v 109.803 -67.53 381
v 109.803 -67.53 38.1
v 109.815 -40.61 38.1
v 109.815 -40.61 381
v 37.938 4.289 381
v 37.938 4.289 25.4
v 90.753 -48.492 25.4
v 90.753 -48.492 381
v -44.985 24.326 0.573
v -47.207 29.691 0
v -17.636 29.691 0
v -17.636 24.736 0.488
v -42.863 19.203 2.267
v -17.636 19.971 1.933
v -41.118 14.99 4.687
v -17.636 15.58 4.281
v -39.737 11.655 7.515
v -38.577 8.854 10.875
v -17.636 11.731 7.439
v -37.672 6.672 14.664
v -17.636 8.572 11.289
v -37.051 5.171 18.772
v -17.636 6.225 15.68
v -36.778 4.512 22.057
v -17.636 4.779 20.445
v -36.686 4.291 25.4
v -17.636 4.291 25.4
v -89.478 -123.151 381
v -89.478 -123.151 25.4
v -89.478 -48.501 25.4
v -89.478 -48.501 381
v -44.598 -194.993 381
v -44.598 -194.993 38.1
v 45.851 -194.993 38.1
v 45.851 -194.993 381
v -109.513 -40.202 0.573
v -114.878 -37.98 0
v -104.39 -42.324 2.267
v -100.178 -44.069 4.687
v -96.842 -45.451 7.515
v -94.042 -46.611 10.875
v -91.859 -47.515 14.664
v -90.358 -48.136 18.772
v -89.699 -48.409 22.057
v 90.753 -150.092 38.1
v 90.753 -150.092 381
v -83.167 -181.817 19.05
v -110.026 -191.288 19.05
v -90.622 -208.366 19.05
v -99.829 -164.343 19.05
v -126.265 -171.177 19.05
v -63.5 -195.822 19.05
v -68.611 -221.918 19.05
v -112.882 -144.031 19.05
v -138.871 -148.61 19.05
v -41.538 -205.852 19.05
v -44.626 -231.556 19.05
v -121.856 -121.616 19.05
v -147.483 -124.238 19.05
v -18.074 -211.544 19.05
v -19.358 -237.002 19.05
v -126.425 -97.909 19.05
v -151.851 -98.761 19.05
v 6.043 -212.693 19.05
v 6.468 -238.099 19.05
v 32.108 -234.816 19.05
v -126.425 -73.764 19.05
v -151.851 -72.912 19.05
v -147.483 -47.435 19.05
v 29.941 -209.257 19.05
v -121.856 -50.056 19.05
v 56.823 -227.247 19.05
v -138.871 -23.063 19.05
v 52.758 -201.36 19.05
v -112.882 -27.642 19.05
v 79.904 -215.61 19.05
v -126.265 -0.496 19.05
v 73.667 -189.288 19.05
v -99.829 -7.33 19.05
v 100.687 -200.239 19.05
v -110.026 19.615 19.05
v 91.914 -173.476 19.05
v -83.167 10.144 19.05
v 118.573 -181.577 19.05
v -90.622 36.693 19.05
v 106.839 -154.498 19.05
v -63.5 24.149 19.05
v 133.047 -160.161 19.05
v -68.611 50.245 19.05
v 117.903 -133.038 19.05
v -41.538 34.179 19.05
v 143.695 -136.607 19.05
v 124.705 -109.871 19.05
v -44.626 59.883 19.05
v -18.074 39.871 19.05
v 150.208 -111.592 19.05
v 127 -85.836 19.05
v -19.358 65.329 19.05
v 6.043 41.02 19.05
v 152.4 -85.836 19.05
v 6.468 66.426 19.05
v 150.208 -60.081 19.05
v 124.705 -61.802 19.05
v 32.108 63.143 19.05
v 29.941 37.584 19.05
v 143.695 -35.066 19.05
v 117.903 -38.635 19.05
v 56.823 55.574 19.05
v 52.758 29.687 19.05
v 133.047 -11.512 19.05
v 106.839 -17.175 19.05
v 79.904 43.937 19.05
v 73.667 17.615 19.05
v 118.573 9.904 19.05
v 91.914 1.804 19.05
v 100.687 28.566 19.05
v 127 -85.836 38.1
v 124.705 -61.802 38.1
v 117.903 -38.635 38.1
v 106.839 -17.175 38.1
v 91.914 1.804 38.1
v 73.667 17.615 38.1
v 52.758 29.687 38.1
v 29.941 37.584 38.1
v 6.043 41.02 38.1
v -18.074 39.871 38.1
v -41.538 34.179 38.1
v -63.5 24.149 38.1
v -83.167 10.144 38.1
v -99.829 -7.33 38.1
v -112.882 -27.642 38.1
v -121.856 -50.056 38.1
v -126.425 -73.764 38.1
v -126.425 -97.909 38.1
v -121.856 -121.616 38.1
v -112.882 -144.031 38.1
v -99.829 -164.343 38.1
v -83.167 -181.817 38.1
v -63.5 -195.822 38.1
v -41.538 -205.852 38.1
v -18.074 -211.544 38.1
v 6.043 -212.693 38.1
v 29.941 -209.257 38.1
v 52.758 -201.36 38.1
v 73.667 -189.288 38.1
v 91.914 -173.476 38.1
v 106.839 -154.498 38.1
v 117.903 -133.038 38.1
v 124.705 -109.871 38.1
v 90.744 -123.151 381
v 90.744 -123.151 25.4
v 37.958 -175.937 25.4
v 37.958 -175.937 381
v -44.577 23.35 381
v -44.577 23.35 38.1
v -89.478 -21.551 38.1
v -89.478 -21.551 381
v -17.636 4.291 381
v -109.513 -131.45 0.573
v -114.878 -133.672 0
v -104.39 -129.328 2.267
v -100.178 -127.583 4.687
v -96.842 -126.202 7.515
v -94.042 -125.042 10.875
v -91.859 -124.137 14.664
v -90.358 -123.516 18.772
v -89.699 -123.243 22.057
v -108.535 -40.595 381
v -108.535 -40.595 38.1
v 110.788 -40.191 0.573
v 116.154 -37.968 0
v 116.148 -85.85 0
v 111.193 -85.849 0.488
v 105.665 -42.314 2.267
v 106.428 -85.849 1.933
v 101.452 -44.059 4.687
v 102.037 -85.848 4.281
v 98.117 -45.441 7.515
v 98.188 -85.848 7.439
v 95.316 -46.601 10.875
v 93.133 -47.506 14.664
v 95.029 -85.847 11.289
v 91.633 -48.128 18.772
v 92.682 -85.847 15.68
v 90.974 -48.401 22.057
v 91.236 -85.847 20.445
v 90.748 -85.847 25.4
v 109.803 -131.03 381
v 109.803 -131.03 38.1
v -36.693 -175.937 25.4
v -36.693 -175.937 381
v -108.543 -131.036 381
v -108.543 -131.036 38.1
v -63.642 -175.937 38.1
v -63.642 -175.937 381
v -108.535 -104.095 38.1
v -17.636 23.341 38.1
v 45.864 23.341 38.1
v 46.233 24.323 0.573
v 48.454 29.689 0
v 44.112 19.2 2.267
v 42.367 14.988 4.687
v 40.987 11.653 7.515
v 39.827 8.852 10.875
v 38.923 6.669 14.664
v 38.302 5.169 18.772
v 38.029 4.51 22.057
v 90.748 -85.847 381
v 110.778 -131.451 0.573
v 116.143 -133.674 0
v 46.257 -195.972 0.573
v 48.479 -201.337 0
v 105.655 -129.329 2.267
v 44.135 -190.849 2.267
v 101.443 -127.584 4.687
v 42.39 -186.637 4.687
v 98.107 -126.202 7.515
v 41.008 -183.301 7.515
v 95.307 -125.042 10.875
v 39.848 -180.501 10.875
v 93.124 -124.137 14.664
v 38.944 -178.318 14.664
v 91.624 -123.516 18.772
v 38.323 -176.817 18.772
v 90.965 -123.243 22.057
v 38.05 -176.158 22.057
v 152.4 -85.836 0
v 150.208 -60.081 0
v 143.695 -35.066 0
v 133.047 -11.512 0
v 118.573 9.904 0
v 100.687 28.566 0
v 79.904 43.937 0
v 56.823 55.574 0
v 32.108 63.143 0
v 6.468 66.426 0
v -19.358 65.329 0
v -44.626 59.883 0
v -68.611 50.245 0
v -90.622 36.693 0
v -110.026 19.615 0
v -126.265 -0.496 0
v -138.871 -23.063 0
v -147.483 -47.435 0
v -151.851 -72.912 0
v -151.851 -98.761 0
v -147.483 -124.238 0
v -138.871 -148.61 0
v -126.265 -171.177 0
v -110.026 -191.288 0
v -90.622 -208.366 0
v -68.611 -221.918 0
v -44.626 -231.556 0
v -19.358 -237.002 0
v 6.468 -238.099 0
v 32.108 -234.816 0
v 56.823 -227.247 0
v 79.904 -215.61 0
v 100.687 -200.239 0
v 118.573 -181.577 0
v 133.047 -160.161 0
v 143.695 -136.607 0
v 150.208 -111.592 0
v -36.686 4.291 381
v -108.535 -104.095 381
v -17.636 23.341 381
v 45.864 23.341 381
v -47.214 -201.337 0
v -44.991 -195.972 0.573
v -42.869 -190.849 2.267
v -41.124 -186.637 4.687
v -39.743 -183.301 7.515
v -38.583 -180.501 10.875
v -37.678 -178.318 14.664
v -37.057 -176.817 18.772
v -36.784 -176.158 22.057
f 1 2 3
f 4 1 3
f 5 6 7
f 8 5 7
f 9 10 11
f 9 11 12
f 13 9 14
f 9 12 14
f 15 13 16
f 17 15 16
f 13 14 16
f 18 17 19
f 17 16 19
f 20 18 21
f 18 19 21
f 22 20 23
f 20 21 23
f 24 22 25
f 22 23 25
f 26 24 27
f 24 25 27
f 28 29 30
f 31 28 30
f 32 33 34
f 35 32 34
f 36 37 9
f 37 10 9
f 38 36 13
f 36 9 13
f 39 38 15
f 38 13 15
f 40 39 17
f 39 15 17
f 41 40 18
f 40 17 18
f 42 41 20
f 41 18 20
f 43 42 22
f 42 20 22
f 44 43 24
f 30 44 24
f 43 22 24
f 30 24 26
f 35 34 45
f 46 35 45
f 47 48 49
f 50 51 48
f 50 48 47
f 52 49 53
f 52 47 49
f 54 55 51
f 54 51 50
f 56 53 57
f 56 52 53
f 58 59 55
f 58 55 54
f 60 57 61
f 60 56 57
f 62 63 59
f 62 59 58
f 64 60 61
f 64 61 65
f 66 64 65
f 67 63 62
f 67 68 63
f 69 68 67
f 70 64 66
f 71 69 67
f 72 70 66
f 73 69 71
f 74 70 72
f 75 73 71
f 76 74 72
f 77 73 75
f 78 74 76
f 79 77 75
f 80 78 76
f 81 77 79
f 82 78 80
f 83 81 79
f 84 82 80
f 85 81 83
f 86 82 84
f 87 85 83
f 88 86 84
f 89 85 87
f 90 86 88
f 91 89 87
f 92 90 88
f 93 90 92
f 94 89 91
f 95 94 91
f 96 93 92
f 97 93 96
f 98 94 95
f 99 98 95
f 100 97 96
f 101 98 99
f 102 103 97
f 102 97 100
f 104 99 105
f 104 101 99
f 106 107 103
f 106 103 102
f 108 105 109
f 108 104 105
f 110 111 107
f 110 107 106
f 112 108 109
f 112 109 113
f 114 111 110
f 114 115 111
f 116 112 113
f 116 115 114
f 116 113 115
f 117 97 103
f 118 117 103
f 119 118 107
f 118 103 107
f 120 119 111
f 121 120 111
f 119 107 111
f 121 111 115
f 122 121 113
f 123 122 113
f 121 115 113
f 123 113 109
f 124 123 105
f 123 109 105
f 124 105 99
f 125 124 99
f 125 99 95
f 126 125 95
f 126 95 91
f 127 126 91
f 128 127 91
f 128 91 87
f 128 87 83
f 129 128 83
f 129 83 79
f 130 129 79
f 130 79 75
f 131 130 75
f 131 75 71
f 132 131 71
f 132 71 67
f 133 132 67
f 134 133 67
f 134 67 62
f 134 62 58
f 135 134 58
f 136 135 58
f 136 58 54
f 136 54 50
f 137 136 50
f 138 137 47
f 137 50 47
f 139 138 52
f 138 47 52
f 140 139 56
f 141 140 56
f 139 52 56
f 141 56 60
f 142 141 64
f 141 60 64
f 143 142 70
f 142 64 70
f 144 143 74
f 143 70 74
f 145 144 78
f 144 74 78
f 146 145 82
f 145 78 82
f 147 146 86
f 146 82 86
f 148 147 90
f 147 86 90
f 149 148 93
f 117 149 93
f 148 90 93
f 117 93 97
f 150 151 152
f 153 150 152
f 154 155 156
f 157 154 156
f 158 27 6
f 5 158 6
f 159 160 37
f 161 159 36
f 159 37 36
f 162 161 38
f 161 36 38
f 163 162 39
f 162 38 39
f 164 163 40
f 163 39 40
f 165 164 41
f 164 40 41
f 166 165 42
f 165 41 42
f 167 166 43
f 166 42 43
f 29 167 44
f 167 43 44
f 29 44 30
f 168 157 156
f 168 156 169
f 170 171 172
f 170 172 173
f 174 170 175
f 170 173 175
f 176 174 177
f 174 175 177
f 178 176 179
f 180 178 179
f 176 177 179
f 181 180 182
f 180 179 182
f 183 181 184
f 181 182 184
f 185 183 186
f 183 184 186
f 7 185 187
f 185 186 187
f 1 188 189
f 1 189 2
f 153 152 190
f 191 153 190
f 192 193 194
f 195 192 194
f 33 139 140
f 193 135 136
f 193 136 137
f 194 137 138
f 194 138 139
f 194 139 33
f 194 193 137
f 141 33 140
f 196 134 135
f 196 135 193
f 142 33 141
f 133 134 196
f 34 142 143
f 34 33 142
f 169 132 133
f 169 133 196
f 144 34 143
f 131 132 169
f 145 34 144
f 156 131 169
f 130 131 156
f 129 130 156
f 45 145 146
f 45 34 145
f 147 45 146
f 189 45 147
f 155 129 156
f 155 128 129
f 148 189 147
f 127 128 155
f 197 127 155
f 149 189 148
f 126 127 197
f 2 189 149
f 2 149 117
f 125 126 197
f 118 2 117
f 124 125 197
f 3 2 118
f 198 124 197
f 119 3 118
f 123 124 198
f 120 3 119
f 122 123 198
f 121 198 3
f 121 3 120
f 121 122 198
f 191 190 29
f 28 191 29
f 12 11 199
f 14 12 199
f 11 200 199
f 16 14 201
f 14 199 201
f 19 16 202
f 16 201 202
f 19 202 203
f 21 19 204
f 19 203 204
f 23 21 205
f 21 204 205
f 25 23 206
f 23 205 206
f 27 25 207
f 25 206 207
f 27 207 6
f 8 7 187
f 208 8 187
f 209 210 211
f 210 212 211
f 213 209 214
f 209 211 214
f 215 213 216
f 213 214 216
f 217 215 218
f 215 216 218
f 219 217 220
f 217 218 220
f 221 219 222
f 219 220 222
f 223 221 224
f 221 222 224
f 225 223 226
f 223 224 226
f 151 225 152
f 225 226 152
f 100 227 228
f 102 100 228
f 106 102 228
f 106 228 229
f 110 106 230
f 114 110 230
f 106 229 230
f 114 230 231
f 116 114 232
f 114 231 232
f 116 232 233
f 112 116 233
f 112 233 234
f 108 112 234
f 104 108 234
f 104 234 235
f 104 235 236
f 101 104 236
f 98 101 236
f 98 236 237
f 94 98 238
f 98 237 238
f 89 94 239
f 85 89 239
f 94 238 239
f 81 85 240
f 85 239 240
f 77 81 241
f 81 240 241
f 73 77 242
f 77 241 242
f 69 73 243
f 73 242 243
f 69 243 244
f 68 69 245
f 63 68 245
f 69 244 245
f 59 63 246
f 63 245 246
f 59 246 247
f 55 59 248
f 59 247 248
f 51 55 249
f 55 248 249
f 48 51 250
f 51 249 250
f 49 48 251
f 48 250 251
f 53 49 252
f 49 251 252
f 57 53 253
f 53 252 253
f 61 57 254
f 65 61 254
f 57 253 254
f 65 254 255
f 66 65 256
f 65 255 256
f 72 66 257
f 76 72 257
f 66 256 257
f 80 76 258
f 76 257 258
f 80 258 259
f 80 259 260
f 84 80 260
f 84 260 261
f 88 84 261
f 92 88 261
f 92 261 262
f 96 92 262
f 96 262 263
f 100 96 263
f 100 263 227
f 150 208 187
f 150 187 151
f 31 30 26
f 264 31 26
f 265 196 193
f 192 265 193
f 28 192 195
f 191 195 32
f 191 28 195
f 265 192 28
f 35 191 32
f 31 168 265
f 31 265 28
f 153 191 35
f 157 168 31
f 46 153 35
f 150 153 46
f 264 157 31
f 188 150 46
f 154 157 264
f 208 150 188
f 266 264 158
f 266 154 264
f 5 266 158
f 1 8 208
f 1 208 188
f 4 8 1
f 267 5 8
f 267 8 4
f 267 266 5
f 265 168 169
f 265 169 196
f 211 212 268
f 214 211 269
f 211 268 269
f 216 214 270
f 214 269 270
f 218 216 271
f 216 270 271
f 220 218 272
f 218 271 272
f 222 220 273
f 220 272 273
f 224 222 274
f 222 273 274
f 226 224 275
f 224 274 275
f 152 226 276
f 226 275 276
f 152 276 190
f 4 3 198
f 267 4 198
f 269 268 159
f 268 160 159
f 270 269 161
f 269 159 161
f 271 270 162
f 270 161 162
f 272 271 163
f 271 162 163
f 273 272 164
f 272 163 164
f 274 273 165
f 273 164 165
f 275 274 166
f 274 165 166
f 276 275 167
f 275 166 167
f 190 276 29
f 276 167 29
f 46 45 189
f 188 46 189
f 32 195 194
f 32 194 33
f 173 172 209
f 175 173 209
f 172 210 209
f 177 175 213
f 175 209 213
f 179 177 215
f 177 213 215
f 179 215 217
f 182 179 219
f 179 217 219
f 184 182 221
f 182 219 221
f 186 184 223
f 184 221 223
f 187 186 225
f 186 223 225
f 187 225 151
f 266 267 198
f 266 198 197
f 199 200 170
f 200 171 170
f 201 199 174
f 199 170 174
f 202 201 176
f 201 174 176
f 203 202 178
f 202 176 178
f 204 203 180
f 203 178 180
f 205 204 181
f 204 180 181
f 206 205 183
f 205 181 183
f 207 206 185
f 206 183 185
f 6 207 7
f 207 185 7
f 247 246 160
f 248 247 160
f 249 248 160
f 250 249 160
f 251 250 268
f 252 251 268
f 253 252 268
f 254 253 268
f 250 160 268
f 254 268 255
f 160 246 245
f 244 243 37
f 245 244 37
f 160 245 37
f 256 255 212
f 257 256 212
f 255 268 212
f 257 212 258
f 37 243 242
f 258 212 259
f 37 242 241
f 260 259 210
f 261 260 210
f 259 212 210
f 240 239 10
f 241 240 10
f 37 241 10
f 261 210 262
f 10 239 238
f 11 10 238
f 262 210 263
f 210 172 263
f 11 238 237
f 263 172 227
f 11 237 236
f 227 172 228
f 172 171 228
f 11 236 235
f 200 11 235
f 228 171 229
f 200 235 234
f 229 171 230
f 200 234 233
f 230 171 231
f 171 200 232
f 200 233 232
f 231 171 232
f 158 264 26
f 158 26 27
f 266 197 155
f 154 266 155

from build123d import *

# Parameters (mm, degrees)
F1_DEPTH = 381
F0_R     = 127
F2_DEPTH = 38.1
F0_R_2   = 152.4
F3_DEPTH = 19.05
F4_R     = 25.4


with BuildPart() as f1:
    # F0 (on Top) → F1 (new body)
    with BuildSketch(Plane.XY):
        Polygon((64.913587, 4.291234), (45.863587, 23.341234), (-17.636413, 23.341234), (-44.577181, 23.349866), (-89.478462, -21.551415), (-108.534565, -40.595311), (-108.534565, -104.095311), (-108.543197, -131.03608), (-63.641916, -175.93736), (-44.59802, -194.993464), (18.90198, -194.993464), (45.85138, -194.993464), (90.752661, -150.092183), (109.802658, -131.029975), (109.802658, -67.529975), (109.814868, -40.610047), align=None)
        Polygon((-89.478462, -48.500815), (-36.686413, 4.291234), (-17.636413, 4.291234), (37.937591, 4.289049), (90.752661, -48.492183), (90.748342, -85.846952), (90.744029, -123.151415), (37.958084, -175.93736), (-36.692516, -175.93736), (-89.478462, -123.151415), (-89.478462, -85.826115), align=None, mode=Mode.SUBTRACT)
    extrude(amount=F1_DEPTH)

    # F0 (on Top) → F2 (join)
    with BuildSketch(Plane.XY):
        with Locations((0, -85.83646)):
            Circle(F0_R)
        Polygon((-17.636413, 23.341234), (45.863587, 23.341234), (64.913587, 4.291234), (109.814868, -40.610047), (109.802658, -67.529975), (109.802658, -131.029975), (90.752661, -150.092183), (45.85138, -194.993464), (18.90198, -194.993464), (-44.59802, -194.993464), (-63.641916, -175.93736), (-108.543197, -131.03608), (-108.534565, -104.095311), (-108.534565, -40.595311), (-89.478462, -21.551415), (-44.577181, 23.349866), align=None, mode=Mode.SUBTRACT)
    extrude(amount=F2_DEPTH)

    # F0 (on Top) → F3 (join)
    with BuildSketch(Plane.XY):
        with Locations((0, -85.83646)):
            Circle(F0_R_2)
        with Locations((0, -85.83646)):
            Circle(F0_R, mode=Mode.SUBTRACT)
    extrude(amount=F3_DEPTH)

    # F4
    f4_edges = [f1.edges().sort_by_distance(p)[0] for p in [
        (-89.478462, -85.826115, 0),
        (-63.085489, -149.544388, 0),
        (-63.082437, -22.10479, 0),
        (-27.161413, 4.291234, 0),
        (10.150589, 4.290141, 0),
        (0.632784, -175.93736, 0),
        (64.351056, -149.544388, 0),
        (90.748345, -85.821799, 0),
        (64.345126, -22.101567, 0),
    ]]
    fillet(f4_edges, radius=F4_R)


solid = f1.part
